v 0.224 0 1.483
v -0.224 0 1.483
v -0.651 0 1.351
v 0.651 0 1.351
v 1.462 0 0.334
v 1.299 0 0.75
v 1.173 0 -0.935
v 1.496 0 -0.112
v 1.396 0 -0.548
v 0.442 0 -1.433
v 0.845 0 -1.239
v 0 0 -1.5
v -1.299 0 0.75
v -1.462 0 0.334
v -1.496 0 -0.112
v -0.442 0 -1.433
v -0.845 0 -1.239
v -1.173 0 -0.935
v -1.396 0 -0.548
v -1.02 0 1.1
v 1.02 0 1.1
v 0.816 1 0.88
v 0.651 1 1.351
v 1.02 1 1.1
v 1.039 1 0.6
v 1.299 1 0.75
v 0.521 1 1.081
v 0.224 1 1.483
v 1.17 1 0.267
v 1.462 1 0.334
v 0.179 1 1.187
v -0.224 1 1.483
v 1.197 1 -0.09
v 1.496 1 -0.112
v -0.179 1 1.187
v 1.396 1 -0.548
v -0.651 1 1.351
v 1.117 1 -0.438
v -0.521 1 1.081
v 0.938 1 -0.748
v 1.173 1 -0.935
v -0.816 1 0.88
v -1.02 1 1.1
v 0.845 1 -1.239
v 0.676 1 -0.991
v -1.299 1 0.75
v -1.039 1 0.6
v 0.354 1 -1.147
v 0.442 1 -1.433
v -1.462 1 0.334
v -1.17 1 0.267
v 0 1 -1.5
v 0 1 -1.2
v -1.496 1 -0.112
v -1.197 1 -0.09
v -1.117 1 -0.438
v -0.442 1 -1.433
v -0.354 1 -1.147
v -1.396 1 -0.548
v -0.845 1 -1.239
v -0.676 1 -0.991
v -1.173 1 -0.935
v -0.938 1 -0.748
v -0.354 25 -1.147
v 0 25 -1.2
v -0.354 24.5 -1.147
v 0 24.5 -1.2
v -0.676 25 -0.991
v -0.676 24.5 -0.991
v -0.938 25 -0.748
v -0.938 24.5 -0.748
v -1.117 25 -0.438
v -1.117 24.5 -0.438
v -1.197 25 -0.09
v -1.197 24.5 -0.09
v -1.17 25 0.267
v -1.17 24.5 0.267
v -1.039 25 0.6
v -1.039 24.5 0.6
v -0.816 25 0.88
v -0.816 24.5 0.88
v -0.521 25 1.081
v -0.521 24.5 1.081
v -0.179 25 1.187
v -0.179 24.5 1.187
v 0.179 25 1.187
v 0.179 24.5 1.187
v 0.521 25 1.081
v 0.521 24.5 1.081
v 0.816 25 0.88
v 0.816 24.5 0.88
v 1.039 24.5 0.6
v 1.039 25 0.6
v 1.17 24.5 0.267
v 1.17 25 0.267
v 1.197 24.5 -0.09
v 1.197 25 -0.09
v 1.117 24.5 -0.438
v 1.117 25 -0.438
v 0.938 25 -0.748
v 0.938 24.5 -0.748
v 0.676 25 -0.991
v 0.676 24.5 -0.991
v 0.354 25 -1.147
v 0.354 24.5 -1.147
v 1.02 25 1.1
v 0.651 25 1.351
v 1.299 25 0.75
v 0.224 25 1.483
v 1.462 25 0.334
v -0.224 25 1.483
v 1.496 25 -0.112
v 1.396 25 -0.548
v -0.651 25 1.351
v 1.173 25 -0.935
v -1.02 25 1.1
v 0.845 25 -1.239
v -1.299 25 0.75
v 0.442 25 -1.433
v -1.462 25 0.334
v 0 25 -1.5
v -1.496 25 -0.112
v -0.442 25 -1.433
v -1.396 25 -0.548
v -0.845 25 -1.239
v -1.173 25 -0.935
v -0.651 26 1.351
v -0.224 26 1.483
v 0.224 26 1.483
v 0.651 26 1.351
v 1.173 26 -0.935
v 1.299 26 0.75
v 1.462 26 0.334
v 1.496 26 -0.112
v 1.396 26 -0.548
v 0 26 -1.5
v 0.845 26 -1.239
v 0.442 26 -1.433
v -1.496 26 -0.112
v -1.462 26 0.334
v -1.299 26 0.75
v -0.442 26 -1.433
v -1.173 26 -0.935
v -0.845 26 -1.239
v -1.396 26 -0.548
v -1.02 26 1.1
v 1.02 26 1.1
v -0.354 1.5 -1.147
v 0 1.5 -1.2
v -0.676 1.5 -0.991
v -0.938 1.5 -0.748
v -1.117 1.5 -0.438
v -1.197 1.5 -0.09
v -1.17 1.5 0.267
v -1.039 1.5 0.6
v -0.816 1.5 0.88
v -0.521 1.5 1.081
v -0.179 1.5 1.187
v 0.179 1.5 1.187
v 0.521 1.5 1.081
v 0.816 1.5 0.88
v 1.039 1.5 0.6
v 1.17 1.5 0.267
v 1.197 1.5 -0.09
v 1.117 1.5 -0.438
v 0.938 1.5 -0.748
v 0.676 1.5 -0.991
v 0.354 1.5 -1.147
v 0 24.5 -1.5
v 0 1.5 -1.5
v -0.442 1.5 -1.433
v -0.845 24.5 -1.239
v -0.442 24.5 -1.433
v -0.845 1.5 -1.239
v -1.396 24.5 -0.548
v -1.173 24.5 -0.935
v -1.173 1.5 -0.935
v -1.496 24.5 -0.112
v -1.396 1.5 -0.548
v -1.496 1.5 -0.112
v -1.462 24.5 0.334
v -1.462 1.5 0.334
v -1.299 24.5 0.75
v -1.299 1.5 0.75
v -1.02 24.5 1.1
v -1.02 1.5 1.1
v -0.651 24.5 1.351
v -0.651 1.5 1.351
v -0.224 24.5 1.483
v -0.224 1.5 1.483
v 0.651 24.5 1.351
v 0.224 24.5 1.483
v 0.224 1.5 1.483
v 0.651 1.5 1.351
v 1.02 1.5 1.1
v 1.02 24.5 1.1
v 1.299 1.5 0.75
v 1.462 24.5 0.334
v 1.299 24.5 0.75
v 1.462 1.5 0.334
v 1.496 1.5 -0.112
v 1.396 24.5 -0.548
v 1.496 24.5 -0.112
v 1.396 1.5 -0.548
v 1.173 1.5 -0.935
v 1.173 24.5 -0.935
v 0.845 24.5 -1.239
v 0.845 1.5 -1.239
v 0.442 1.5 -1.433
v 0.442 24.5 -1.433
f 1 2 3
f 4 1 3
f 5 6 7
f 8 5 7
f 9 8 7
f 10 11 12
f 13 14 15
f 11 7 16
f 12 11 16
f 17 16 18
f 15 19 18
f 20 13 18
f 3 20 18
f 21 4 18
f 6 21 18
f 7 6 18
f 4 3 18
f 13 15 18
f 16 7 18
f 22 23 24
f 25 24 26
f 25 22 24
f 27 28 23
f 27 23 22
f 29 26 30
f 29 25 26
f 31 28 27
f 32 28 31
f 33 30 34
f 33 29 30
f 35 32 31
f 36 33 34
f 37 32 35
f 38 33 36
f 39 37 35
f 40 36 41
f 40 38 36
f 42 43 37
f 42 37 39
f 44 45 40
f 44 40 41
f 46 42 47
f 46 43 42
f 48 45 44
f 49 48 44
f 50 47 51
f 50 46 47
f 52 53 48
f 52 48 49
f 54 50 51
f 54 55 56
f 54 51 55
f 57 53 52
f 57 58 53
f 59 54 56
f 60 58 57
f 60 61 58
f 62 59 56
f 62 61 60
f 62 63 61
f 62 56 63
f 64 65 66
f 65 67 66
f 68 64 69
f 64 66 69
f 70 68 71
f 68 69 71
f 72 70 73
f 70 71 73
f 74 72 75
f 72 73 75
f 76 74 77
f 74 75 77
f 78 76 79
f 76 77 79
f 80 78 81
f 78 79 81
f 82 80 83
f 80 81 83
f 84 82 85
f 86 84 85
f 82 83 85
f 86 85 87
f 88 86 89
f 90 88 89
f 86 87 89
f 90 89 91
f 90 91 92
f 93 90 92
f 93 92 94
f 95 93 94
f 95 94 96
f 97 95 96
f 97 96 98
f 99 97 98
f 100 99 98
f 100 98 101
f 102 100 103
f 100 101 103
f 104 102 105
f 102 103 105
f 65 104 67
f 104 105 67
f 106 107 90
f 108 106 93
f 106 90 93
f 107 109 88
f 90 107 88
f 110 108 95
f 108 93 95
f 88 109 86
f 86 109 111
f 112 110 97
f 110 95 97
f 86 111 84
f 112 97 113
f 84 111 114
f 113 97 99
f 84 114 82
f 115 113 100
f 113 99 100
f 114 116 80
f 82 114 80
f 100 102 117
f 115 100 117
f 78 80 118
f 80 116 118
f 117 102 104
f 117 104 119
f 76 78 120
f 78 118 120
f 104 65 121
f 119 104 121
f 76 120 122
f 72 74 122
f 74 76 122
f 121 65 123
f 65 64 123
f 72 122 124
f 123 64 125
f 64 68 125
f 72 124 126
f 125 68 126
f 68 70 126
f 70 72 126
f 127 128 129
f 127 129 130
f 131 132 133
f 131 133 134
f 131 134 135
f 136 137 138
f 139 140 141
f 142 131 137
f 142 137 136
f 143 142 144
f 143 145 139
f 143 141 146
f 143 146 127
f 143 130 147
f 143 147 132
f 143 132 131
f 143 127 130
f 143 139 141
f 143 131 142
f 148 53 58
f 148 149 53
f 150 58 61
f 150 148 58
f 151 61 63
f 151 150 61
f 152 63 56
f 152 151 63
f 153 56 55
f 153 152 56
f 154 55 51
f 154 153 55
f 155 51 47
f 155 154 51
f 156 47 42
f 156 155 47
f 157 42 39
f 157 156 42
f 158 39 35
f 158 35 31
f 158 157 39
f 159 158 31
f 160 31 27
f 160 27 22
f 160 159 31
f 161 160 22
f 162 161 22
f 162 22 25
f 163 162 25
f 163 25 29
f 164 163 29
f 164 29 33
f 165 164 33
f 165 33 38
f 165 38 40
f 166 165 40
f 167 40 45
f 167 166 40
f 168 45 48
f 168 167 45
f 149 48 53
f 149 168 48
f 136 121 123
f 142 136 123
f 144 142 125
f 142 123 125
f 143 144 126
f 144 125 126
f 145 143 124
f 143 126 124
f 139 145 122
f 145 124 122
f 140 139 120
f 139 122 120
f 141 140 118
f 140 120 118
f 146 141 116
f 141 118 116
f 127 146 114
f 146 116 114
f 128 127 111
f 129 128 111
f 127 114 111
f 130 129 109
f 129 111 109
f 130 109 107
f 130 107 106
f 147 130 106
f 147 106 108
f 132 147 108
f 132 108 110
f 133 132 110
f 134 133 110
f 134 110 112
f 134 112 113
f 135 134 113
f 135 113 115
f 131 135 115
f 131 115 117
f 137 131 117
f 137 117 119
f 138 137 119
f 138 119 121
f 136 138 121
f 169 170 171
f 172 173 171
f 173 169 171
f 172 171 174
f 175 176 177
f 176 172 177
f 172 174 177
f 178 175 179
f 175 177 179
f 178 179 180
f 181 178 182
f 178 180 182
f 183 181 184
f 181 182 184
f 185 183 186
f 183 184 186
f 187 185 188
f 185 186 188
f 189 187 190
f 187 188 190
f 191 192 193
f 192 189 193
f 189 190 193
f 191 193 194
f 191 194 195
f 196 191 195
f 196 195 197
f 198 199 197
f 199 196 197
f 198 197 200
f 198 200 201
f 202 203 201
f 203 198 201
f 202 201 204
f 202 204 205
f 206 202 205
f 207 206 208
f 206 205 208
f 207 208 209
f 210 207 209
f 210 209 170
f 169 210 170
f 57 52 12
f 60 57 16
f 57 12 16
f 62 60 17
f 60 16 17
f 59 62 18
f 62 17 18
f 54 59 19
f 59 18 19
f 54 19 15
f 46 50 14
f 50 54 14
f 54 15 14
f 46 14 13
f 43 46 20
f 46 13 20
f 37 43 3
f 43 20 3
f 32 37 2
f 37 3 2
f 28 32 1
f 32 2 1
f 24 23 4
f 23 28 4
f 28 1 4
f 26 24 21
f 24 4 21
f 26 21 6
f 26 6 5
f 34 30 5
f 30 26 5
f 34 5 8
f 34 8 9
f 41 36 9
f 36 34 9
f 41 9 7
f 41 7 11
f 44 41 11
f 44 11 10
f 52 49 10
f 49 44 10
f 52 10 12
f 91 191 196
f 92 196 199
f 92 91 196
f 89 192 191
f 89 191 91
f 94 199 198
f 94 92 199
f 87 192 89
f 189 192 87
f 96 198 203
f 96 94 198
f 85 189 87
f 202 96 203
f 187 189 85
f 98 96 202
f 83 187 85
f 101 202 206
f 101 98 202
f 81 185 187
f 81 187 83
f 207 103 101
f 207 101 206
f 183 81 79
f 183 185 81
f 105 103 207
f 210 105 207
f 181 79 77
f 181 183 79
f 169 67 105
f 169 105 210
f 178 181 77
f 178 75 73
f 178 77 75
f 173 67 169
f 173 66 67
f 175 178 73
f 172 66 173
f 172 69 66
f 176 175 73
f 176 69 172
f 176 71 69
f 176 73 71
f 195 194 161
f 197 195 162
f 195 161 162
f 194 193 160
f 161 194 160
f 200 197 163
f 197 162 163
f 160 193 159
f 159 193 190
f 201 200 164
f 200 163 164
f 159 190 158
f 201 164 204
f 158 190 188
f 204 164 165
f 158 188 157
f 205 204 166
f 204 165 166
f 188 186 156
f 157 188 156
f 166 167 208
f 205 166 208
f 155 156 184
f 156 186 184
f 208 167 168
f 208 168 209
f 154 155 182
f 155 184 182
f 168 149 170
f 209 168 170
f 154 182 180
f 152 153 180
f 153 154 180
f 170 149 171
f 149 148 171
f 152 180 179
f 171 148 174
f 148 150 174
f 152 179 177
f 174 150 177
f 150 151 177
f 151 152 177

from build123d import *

# Parameters (mm, degrees)
SKETCH1_R           = 1.5
BOSS_EXTRUDE1_DEPTH = 26
SKETCH2_W           = 2.6975544
SKETCH2_H           = 0.5


with BuildPart() as part:
    # Sketch1 → Boss-Extrude1 (new body)
    with BuildSketch(Plane(origin=(0, 0, 0), x_dir=(1, 0, 0), z_dir=(0, 1, 0))):
        with Locations(Location((0, 0, 0), (0, 0, 90))):
            Circle(SKETCH1_R)
    extrude(amount=BOSS_EXTRUDE1_DEPTH)

    # Sketch2 → Cut-Revolve1 (revolve, cut)
    with BuildSketch(Plane(origin=(0, 0, 0), x_dir=(0, 0, -1), z_dir=(1, 0, 0)), mode=Mode.PRIVATE) as cut_revolve1_sk:
        with Locations((-2.5487772, 1.25)):
            Rectangle(SKETCH2_W, SKETCH2_H)
    cut_revolve1 = revolve(cut_revolve1_sk.sketch.rotate(Axis((0, 0, 0), (0, 1, 0)), 180), axis=Axis((0, 0, 0), (0, 1, 0)), mode=Mode.SUBTRACT)

    # Mirror1: Cut-Revolve1 across plane
    add(cut_revolve1.mirror(Plane.ZX.offset(13)), mode=Mode.SUBTRACT)


solid = part.part
